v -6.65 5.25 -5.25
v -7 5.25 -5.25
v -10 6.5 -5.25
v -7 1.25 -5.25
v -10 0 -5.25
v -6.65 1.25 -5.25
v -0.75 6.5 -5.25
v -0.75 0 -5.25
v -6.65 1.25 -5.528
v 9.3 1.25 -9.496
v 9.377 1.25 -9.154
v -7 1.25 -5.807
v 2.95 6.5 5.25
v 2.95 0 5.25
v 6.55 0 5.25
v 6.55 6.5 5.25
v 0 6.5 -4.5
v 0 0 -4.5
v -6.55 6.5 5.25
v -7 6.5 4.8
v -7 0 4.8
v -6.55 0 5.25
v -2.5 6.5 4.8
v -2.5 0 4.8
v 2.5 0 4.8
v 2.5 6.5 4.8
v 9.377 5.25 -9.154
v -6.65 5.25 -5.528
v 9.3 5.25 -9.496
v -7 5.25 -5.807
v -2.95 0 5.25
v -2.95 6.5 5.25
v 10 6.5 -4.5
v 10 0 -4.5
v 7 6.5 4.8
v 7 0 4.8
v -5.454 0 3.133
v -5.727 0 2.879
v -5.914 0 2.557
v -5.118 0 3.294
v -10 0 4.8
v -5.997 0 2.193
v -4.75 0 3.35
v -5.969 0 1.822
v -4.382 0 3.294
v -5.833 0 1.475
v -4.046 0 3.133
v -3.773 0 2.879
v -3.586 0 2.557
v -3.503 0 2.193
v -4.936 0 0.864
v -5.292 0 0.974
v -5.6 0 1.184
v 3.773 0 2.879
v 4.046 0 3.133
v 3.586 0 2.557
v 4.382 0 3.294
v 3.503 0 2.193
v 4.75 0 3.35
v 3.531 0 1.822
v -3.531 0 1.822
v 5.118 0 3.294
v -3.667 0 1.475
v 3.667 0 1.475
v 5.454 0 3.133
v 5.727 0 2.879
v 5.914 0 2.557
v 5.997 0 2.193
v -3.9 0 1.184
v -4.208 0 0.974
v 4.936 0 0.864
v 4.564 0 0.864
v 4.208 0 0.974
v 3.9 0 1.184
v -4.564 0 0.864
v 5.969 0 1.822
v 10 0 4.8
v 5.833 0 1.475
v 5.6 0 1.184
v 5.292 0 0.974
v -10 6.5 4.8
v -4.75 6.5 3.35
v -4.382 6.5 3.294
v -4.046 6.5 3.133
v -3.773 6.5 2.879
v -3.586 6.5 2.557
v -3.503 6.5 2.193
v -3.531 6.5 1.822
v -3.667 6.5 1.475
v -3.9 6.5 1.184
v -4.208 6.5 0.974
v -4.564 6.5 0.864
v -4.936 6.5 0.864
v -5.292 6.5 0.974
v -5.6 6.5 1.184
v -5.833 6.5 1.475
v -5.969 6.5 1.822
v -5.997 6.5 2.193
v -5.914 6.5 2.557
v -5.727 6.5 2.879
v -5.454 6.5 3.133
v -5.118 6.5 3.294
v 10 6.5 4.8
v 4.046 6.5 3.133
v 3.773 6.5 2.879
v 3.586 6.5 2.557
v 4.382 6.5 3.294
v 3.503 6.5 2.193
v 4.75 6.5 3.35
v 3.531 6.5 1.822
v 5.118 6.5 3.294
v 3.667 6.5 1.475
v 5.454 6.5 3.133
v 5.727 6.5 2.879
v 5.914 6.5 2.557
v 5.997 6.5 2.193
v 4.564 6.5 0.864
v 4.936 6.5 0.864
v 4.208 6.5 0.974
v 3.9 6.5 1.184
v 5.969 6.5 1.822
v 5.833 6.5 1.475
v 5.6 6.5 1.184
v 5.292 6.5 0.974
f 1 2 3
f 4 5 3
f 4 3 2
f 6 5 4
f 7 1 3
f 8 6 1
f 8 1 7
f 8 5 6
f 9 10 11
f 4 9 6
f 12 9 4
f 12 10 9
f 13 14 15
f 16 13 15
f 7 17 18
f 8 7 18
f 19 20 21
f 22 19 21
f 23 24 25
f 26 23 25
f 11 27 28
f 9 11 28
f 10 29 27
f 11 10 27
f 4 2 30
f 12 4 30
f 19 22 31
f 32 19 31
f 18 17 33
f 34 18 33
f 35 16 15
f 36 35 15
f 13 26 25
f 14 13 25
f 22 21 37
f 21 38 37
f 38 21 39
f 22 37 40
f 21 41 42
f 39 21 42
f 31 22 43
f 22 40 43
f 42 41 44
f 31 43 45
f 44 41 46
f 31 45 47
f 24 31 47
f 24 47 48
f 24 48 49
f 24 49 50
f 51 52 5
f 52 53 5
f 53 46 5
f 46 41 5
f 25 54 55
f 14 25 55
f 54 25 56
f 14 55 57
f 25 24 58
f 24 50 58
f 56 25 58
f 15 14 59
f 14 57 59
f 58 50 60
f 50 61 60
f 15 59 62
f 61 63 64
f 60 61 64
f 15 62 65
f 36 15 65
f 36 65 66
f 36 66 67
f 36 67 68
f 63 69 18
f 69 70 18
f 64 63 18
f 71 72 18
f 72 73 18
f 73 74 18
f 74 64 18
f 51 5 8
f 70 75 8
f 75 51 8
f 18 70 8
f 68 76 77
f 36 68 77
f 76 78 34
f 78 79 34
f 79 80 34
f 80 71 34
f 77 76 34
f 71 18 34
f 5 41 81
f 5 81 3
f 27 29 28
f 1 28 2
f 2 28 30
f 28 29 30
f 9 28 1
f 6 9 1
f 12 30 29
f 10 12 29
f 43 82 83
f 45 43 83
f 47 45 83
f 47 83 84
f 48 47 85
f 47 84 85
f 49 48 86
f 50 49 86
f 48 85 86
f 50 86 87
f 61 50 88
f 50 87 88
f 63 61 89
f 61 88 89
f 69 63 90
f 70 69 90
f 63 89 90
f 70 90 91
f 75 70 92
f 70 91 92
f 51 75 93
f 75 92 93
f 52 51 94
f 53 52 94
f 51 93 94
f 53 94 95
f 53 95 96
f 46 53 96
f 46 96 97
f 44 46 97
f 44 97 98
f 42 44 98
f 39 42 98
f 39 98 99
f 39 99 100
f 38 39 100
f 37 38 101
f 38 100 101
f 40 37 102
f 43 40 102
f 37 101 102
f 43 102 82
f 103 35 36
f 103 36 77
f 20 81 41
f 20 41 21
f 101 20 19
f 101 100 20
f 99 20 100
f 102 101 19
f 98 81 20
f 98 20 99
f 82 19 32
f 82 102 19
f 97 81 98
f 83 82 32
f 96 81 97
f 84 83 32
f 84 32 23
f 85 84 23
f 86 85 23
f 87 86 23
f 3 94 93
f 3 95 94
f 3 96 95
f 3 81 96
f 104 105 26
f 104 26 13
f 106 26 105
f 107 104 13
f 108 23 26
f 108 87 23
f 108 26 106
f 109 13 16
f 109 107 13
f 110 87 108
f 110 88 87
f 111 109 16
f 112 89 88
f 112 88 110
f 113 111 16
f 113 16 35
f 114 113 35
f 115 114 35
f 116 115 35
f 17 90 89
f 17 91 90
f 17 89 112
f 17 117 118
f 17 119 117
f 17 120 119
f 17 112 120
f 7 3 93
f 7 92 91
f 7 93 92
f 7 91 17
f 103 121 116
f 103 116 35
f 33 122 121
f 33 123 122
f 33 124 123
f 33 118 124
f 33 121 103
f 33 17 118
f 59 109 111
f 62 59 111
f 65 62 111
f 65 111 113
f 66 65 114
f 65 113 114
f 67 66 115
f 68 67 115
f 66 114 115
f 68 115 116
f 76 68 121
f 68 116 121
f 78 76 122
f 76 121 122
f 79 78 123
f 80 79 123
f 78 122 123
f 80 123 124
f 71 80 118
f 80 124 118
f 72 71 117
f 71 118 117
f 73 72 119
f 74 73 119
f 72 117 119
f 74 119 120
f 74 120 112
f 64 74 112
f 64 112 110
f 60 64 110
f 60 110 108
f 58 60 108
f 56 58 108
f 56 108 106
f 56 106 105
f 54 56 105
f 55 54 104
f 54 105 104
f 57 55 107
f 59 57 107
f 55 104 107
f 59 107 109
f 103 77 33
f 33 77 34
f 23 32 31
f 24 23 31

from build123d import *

# Parameters (mm, degrees)
SKETCH_1_W          = 20
SKETCH_1_H          = 10.5
EXTRUDE_1_DEPTH     = 6.5
SKETCH_2_R          = 1.25
CUT_EXTRUDE_1_DEPTH = 6.5
SKETCH_3_W          = 4.44626532
SKETCH_3_H          = 1.008872475
SKETCH_3_W_2        = 5
SKETCH_3_W_3        = 3.65317203
CUT_EXTRUDE_2_DEPTH = 6.5
CHAMFER_1_SIZE      = 0.45
SKETCH_4_W          = 10.31021277
SKETCH_4_H          = 1.008783122
CUT_EXTRUDE_3_DEPTH = 6.5
CHAMFER_2_SIZE      = 0.75
EXTRUDE_2_DEPTH     = 4


with BuildPart() as part:
    # 스케치1 → 보스-돌출1 (new body)
    with BuildSketch(Plane(origin=(0, 0, 0), x_dir=(1, 0, 0), z_dir=(0, 1, 0))):
        Rectangle(SKETCH_1_W, SKETCH_1_H)
    extrude(amount=EXTRUDE_1_DEPTH)

    # 스케치2 → 컷-돌출1 (cut)
    with BuildSketch(Plane(origin=(0, 6.5, 0), x_dir=(1, 0, 0), z_dir=(0, 1, 0))):
        with Locations(Location((-4.75, -2.1, 0), (0, 0, 270))):
            Circle(SKETCH_2_R)
        with Locations(Location((4.75, -2.1, 0), (0, 0, 270))):
            Circle(SKETCH_2_R)
    extrude(amount=-CUT_EXTRUDE_1_DEPTH, mode=Mode.SUBTRACT)

    # 스케치3 → 컷-돌출2 (cut)
    with BuildSketch(Plane(origin=(0, 6.5, 0), x_dir=(1, 0, 0), z_dir=(0, 1, 0))):
        with Locations((-9.22313266, -5.304436238)):
            Rectangle(SKETCH_3_W, SKETCH_3_H)
        with Locations((0, -5.304436238)):
            Rectangle(SKETCH_3_W_2, SKETCH_3_H)
        with Locations((8.826586015, -5.304436238)):
            Rectangle(SKETCH_3_W_3, SKETCH_3_H)
    extrude(amount=-CUT_EXTRUDE_2_DEPTH, mode=Mode.SUBTRACT)

    # 모따기1
    chamfer_1_edges = [part.edges().sort_by_distance(p)[0] for p in [
        (7, 3.25, 5.25),
        (2.5, 3.25, 5.25),
        (-2.5, 3.25, 5.25),
        (-7, 3.25, 5.25),
    ]]
    chamfer(chamfer_1_edges, length=CHAMFER_1_SIZE - 0.0001)  # a hair under: the kernel refuses the full size

    # 스케치4 → 컷-돌출3 (cut)
    with BuildSketch(Plane(origin=(0, 6.5, 0), x_dir=(1, 0, 0), z_dir=(0, 1, 0))):
        with Locations((5.155106385, 5.004391561)):
            Rectangle(SKETCH_4_W, SKETCH_4_H)
    extrude(amount=-CUT_EXTRUDE_3_DEPTH, mode=Mode.SUBTRACT)

    # 모따기2
    chamfer_2_edges = [part.edges().sort_by_distance(p)[0] for p in [
        (0, 3.25, -5.25),
    ]]
    chamfer(chamfer_2_edges, length=CHAMFER_2_SIZE - 0.0001)  # a hair under: the kernel refuses the full size

    # 스케치5 → 보스-돌출2 (add)
    with BuildSketch(Plane(origin=(0, 5.25, 0), x_dir=(1, 0, 0), z_dir=(0, 1, 0))):
        Polygon((-6.65, 5.25), (-7, 5.25), (-7, 5.807319656), (9.3, 9.495633097), (9.377244102, 9.154263285), (-6.65, 5.527668202), align=None)
    extrude(amount=-EXTRUDE_2_DEPTH)


solid = part.part
